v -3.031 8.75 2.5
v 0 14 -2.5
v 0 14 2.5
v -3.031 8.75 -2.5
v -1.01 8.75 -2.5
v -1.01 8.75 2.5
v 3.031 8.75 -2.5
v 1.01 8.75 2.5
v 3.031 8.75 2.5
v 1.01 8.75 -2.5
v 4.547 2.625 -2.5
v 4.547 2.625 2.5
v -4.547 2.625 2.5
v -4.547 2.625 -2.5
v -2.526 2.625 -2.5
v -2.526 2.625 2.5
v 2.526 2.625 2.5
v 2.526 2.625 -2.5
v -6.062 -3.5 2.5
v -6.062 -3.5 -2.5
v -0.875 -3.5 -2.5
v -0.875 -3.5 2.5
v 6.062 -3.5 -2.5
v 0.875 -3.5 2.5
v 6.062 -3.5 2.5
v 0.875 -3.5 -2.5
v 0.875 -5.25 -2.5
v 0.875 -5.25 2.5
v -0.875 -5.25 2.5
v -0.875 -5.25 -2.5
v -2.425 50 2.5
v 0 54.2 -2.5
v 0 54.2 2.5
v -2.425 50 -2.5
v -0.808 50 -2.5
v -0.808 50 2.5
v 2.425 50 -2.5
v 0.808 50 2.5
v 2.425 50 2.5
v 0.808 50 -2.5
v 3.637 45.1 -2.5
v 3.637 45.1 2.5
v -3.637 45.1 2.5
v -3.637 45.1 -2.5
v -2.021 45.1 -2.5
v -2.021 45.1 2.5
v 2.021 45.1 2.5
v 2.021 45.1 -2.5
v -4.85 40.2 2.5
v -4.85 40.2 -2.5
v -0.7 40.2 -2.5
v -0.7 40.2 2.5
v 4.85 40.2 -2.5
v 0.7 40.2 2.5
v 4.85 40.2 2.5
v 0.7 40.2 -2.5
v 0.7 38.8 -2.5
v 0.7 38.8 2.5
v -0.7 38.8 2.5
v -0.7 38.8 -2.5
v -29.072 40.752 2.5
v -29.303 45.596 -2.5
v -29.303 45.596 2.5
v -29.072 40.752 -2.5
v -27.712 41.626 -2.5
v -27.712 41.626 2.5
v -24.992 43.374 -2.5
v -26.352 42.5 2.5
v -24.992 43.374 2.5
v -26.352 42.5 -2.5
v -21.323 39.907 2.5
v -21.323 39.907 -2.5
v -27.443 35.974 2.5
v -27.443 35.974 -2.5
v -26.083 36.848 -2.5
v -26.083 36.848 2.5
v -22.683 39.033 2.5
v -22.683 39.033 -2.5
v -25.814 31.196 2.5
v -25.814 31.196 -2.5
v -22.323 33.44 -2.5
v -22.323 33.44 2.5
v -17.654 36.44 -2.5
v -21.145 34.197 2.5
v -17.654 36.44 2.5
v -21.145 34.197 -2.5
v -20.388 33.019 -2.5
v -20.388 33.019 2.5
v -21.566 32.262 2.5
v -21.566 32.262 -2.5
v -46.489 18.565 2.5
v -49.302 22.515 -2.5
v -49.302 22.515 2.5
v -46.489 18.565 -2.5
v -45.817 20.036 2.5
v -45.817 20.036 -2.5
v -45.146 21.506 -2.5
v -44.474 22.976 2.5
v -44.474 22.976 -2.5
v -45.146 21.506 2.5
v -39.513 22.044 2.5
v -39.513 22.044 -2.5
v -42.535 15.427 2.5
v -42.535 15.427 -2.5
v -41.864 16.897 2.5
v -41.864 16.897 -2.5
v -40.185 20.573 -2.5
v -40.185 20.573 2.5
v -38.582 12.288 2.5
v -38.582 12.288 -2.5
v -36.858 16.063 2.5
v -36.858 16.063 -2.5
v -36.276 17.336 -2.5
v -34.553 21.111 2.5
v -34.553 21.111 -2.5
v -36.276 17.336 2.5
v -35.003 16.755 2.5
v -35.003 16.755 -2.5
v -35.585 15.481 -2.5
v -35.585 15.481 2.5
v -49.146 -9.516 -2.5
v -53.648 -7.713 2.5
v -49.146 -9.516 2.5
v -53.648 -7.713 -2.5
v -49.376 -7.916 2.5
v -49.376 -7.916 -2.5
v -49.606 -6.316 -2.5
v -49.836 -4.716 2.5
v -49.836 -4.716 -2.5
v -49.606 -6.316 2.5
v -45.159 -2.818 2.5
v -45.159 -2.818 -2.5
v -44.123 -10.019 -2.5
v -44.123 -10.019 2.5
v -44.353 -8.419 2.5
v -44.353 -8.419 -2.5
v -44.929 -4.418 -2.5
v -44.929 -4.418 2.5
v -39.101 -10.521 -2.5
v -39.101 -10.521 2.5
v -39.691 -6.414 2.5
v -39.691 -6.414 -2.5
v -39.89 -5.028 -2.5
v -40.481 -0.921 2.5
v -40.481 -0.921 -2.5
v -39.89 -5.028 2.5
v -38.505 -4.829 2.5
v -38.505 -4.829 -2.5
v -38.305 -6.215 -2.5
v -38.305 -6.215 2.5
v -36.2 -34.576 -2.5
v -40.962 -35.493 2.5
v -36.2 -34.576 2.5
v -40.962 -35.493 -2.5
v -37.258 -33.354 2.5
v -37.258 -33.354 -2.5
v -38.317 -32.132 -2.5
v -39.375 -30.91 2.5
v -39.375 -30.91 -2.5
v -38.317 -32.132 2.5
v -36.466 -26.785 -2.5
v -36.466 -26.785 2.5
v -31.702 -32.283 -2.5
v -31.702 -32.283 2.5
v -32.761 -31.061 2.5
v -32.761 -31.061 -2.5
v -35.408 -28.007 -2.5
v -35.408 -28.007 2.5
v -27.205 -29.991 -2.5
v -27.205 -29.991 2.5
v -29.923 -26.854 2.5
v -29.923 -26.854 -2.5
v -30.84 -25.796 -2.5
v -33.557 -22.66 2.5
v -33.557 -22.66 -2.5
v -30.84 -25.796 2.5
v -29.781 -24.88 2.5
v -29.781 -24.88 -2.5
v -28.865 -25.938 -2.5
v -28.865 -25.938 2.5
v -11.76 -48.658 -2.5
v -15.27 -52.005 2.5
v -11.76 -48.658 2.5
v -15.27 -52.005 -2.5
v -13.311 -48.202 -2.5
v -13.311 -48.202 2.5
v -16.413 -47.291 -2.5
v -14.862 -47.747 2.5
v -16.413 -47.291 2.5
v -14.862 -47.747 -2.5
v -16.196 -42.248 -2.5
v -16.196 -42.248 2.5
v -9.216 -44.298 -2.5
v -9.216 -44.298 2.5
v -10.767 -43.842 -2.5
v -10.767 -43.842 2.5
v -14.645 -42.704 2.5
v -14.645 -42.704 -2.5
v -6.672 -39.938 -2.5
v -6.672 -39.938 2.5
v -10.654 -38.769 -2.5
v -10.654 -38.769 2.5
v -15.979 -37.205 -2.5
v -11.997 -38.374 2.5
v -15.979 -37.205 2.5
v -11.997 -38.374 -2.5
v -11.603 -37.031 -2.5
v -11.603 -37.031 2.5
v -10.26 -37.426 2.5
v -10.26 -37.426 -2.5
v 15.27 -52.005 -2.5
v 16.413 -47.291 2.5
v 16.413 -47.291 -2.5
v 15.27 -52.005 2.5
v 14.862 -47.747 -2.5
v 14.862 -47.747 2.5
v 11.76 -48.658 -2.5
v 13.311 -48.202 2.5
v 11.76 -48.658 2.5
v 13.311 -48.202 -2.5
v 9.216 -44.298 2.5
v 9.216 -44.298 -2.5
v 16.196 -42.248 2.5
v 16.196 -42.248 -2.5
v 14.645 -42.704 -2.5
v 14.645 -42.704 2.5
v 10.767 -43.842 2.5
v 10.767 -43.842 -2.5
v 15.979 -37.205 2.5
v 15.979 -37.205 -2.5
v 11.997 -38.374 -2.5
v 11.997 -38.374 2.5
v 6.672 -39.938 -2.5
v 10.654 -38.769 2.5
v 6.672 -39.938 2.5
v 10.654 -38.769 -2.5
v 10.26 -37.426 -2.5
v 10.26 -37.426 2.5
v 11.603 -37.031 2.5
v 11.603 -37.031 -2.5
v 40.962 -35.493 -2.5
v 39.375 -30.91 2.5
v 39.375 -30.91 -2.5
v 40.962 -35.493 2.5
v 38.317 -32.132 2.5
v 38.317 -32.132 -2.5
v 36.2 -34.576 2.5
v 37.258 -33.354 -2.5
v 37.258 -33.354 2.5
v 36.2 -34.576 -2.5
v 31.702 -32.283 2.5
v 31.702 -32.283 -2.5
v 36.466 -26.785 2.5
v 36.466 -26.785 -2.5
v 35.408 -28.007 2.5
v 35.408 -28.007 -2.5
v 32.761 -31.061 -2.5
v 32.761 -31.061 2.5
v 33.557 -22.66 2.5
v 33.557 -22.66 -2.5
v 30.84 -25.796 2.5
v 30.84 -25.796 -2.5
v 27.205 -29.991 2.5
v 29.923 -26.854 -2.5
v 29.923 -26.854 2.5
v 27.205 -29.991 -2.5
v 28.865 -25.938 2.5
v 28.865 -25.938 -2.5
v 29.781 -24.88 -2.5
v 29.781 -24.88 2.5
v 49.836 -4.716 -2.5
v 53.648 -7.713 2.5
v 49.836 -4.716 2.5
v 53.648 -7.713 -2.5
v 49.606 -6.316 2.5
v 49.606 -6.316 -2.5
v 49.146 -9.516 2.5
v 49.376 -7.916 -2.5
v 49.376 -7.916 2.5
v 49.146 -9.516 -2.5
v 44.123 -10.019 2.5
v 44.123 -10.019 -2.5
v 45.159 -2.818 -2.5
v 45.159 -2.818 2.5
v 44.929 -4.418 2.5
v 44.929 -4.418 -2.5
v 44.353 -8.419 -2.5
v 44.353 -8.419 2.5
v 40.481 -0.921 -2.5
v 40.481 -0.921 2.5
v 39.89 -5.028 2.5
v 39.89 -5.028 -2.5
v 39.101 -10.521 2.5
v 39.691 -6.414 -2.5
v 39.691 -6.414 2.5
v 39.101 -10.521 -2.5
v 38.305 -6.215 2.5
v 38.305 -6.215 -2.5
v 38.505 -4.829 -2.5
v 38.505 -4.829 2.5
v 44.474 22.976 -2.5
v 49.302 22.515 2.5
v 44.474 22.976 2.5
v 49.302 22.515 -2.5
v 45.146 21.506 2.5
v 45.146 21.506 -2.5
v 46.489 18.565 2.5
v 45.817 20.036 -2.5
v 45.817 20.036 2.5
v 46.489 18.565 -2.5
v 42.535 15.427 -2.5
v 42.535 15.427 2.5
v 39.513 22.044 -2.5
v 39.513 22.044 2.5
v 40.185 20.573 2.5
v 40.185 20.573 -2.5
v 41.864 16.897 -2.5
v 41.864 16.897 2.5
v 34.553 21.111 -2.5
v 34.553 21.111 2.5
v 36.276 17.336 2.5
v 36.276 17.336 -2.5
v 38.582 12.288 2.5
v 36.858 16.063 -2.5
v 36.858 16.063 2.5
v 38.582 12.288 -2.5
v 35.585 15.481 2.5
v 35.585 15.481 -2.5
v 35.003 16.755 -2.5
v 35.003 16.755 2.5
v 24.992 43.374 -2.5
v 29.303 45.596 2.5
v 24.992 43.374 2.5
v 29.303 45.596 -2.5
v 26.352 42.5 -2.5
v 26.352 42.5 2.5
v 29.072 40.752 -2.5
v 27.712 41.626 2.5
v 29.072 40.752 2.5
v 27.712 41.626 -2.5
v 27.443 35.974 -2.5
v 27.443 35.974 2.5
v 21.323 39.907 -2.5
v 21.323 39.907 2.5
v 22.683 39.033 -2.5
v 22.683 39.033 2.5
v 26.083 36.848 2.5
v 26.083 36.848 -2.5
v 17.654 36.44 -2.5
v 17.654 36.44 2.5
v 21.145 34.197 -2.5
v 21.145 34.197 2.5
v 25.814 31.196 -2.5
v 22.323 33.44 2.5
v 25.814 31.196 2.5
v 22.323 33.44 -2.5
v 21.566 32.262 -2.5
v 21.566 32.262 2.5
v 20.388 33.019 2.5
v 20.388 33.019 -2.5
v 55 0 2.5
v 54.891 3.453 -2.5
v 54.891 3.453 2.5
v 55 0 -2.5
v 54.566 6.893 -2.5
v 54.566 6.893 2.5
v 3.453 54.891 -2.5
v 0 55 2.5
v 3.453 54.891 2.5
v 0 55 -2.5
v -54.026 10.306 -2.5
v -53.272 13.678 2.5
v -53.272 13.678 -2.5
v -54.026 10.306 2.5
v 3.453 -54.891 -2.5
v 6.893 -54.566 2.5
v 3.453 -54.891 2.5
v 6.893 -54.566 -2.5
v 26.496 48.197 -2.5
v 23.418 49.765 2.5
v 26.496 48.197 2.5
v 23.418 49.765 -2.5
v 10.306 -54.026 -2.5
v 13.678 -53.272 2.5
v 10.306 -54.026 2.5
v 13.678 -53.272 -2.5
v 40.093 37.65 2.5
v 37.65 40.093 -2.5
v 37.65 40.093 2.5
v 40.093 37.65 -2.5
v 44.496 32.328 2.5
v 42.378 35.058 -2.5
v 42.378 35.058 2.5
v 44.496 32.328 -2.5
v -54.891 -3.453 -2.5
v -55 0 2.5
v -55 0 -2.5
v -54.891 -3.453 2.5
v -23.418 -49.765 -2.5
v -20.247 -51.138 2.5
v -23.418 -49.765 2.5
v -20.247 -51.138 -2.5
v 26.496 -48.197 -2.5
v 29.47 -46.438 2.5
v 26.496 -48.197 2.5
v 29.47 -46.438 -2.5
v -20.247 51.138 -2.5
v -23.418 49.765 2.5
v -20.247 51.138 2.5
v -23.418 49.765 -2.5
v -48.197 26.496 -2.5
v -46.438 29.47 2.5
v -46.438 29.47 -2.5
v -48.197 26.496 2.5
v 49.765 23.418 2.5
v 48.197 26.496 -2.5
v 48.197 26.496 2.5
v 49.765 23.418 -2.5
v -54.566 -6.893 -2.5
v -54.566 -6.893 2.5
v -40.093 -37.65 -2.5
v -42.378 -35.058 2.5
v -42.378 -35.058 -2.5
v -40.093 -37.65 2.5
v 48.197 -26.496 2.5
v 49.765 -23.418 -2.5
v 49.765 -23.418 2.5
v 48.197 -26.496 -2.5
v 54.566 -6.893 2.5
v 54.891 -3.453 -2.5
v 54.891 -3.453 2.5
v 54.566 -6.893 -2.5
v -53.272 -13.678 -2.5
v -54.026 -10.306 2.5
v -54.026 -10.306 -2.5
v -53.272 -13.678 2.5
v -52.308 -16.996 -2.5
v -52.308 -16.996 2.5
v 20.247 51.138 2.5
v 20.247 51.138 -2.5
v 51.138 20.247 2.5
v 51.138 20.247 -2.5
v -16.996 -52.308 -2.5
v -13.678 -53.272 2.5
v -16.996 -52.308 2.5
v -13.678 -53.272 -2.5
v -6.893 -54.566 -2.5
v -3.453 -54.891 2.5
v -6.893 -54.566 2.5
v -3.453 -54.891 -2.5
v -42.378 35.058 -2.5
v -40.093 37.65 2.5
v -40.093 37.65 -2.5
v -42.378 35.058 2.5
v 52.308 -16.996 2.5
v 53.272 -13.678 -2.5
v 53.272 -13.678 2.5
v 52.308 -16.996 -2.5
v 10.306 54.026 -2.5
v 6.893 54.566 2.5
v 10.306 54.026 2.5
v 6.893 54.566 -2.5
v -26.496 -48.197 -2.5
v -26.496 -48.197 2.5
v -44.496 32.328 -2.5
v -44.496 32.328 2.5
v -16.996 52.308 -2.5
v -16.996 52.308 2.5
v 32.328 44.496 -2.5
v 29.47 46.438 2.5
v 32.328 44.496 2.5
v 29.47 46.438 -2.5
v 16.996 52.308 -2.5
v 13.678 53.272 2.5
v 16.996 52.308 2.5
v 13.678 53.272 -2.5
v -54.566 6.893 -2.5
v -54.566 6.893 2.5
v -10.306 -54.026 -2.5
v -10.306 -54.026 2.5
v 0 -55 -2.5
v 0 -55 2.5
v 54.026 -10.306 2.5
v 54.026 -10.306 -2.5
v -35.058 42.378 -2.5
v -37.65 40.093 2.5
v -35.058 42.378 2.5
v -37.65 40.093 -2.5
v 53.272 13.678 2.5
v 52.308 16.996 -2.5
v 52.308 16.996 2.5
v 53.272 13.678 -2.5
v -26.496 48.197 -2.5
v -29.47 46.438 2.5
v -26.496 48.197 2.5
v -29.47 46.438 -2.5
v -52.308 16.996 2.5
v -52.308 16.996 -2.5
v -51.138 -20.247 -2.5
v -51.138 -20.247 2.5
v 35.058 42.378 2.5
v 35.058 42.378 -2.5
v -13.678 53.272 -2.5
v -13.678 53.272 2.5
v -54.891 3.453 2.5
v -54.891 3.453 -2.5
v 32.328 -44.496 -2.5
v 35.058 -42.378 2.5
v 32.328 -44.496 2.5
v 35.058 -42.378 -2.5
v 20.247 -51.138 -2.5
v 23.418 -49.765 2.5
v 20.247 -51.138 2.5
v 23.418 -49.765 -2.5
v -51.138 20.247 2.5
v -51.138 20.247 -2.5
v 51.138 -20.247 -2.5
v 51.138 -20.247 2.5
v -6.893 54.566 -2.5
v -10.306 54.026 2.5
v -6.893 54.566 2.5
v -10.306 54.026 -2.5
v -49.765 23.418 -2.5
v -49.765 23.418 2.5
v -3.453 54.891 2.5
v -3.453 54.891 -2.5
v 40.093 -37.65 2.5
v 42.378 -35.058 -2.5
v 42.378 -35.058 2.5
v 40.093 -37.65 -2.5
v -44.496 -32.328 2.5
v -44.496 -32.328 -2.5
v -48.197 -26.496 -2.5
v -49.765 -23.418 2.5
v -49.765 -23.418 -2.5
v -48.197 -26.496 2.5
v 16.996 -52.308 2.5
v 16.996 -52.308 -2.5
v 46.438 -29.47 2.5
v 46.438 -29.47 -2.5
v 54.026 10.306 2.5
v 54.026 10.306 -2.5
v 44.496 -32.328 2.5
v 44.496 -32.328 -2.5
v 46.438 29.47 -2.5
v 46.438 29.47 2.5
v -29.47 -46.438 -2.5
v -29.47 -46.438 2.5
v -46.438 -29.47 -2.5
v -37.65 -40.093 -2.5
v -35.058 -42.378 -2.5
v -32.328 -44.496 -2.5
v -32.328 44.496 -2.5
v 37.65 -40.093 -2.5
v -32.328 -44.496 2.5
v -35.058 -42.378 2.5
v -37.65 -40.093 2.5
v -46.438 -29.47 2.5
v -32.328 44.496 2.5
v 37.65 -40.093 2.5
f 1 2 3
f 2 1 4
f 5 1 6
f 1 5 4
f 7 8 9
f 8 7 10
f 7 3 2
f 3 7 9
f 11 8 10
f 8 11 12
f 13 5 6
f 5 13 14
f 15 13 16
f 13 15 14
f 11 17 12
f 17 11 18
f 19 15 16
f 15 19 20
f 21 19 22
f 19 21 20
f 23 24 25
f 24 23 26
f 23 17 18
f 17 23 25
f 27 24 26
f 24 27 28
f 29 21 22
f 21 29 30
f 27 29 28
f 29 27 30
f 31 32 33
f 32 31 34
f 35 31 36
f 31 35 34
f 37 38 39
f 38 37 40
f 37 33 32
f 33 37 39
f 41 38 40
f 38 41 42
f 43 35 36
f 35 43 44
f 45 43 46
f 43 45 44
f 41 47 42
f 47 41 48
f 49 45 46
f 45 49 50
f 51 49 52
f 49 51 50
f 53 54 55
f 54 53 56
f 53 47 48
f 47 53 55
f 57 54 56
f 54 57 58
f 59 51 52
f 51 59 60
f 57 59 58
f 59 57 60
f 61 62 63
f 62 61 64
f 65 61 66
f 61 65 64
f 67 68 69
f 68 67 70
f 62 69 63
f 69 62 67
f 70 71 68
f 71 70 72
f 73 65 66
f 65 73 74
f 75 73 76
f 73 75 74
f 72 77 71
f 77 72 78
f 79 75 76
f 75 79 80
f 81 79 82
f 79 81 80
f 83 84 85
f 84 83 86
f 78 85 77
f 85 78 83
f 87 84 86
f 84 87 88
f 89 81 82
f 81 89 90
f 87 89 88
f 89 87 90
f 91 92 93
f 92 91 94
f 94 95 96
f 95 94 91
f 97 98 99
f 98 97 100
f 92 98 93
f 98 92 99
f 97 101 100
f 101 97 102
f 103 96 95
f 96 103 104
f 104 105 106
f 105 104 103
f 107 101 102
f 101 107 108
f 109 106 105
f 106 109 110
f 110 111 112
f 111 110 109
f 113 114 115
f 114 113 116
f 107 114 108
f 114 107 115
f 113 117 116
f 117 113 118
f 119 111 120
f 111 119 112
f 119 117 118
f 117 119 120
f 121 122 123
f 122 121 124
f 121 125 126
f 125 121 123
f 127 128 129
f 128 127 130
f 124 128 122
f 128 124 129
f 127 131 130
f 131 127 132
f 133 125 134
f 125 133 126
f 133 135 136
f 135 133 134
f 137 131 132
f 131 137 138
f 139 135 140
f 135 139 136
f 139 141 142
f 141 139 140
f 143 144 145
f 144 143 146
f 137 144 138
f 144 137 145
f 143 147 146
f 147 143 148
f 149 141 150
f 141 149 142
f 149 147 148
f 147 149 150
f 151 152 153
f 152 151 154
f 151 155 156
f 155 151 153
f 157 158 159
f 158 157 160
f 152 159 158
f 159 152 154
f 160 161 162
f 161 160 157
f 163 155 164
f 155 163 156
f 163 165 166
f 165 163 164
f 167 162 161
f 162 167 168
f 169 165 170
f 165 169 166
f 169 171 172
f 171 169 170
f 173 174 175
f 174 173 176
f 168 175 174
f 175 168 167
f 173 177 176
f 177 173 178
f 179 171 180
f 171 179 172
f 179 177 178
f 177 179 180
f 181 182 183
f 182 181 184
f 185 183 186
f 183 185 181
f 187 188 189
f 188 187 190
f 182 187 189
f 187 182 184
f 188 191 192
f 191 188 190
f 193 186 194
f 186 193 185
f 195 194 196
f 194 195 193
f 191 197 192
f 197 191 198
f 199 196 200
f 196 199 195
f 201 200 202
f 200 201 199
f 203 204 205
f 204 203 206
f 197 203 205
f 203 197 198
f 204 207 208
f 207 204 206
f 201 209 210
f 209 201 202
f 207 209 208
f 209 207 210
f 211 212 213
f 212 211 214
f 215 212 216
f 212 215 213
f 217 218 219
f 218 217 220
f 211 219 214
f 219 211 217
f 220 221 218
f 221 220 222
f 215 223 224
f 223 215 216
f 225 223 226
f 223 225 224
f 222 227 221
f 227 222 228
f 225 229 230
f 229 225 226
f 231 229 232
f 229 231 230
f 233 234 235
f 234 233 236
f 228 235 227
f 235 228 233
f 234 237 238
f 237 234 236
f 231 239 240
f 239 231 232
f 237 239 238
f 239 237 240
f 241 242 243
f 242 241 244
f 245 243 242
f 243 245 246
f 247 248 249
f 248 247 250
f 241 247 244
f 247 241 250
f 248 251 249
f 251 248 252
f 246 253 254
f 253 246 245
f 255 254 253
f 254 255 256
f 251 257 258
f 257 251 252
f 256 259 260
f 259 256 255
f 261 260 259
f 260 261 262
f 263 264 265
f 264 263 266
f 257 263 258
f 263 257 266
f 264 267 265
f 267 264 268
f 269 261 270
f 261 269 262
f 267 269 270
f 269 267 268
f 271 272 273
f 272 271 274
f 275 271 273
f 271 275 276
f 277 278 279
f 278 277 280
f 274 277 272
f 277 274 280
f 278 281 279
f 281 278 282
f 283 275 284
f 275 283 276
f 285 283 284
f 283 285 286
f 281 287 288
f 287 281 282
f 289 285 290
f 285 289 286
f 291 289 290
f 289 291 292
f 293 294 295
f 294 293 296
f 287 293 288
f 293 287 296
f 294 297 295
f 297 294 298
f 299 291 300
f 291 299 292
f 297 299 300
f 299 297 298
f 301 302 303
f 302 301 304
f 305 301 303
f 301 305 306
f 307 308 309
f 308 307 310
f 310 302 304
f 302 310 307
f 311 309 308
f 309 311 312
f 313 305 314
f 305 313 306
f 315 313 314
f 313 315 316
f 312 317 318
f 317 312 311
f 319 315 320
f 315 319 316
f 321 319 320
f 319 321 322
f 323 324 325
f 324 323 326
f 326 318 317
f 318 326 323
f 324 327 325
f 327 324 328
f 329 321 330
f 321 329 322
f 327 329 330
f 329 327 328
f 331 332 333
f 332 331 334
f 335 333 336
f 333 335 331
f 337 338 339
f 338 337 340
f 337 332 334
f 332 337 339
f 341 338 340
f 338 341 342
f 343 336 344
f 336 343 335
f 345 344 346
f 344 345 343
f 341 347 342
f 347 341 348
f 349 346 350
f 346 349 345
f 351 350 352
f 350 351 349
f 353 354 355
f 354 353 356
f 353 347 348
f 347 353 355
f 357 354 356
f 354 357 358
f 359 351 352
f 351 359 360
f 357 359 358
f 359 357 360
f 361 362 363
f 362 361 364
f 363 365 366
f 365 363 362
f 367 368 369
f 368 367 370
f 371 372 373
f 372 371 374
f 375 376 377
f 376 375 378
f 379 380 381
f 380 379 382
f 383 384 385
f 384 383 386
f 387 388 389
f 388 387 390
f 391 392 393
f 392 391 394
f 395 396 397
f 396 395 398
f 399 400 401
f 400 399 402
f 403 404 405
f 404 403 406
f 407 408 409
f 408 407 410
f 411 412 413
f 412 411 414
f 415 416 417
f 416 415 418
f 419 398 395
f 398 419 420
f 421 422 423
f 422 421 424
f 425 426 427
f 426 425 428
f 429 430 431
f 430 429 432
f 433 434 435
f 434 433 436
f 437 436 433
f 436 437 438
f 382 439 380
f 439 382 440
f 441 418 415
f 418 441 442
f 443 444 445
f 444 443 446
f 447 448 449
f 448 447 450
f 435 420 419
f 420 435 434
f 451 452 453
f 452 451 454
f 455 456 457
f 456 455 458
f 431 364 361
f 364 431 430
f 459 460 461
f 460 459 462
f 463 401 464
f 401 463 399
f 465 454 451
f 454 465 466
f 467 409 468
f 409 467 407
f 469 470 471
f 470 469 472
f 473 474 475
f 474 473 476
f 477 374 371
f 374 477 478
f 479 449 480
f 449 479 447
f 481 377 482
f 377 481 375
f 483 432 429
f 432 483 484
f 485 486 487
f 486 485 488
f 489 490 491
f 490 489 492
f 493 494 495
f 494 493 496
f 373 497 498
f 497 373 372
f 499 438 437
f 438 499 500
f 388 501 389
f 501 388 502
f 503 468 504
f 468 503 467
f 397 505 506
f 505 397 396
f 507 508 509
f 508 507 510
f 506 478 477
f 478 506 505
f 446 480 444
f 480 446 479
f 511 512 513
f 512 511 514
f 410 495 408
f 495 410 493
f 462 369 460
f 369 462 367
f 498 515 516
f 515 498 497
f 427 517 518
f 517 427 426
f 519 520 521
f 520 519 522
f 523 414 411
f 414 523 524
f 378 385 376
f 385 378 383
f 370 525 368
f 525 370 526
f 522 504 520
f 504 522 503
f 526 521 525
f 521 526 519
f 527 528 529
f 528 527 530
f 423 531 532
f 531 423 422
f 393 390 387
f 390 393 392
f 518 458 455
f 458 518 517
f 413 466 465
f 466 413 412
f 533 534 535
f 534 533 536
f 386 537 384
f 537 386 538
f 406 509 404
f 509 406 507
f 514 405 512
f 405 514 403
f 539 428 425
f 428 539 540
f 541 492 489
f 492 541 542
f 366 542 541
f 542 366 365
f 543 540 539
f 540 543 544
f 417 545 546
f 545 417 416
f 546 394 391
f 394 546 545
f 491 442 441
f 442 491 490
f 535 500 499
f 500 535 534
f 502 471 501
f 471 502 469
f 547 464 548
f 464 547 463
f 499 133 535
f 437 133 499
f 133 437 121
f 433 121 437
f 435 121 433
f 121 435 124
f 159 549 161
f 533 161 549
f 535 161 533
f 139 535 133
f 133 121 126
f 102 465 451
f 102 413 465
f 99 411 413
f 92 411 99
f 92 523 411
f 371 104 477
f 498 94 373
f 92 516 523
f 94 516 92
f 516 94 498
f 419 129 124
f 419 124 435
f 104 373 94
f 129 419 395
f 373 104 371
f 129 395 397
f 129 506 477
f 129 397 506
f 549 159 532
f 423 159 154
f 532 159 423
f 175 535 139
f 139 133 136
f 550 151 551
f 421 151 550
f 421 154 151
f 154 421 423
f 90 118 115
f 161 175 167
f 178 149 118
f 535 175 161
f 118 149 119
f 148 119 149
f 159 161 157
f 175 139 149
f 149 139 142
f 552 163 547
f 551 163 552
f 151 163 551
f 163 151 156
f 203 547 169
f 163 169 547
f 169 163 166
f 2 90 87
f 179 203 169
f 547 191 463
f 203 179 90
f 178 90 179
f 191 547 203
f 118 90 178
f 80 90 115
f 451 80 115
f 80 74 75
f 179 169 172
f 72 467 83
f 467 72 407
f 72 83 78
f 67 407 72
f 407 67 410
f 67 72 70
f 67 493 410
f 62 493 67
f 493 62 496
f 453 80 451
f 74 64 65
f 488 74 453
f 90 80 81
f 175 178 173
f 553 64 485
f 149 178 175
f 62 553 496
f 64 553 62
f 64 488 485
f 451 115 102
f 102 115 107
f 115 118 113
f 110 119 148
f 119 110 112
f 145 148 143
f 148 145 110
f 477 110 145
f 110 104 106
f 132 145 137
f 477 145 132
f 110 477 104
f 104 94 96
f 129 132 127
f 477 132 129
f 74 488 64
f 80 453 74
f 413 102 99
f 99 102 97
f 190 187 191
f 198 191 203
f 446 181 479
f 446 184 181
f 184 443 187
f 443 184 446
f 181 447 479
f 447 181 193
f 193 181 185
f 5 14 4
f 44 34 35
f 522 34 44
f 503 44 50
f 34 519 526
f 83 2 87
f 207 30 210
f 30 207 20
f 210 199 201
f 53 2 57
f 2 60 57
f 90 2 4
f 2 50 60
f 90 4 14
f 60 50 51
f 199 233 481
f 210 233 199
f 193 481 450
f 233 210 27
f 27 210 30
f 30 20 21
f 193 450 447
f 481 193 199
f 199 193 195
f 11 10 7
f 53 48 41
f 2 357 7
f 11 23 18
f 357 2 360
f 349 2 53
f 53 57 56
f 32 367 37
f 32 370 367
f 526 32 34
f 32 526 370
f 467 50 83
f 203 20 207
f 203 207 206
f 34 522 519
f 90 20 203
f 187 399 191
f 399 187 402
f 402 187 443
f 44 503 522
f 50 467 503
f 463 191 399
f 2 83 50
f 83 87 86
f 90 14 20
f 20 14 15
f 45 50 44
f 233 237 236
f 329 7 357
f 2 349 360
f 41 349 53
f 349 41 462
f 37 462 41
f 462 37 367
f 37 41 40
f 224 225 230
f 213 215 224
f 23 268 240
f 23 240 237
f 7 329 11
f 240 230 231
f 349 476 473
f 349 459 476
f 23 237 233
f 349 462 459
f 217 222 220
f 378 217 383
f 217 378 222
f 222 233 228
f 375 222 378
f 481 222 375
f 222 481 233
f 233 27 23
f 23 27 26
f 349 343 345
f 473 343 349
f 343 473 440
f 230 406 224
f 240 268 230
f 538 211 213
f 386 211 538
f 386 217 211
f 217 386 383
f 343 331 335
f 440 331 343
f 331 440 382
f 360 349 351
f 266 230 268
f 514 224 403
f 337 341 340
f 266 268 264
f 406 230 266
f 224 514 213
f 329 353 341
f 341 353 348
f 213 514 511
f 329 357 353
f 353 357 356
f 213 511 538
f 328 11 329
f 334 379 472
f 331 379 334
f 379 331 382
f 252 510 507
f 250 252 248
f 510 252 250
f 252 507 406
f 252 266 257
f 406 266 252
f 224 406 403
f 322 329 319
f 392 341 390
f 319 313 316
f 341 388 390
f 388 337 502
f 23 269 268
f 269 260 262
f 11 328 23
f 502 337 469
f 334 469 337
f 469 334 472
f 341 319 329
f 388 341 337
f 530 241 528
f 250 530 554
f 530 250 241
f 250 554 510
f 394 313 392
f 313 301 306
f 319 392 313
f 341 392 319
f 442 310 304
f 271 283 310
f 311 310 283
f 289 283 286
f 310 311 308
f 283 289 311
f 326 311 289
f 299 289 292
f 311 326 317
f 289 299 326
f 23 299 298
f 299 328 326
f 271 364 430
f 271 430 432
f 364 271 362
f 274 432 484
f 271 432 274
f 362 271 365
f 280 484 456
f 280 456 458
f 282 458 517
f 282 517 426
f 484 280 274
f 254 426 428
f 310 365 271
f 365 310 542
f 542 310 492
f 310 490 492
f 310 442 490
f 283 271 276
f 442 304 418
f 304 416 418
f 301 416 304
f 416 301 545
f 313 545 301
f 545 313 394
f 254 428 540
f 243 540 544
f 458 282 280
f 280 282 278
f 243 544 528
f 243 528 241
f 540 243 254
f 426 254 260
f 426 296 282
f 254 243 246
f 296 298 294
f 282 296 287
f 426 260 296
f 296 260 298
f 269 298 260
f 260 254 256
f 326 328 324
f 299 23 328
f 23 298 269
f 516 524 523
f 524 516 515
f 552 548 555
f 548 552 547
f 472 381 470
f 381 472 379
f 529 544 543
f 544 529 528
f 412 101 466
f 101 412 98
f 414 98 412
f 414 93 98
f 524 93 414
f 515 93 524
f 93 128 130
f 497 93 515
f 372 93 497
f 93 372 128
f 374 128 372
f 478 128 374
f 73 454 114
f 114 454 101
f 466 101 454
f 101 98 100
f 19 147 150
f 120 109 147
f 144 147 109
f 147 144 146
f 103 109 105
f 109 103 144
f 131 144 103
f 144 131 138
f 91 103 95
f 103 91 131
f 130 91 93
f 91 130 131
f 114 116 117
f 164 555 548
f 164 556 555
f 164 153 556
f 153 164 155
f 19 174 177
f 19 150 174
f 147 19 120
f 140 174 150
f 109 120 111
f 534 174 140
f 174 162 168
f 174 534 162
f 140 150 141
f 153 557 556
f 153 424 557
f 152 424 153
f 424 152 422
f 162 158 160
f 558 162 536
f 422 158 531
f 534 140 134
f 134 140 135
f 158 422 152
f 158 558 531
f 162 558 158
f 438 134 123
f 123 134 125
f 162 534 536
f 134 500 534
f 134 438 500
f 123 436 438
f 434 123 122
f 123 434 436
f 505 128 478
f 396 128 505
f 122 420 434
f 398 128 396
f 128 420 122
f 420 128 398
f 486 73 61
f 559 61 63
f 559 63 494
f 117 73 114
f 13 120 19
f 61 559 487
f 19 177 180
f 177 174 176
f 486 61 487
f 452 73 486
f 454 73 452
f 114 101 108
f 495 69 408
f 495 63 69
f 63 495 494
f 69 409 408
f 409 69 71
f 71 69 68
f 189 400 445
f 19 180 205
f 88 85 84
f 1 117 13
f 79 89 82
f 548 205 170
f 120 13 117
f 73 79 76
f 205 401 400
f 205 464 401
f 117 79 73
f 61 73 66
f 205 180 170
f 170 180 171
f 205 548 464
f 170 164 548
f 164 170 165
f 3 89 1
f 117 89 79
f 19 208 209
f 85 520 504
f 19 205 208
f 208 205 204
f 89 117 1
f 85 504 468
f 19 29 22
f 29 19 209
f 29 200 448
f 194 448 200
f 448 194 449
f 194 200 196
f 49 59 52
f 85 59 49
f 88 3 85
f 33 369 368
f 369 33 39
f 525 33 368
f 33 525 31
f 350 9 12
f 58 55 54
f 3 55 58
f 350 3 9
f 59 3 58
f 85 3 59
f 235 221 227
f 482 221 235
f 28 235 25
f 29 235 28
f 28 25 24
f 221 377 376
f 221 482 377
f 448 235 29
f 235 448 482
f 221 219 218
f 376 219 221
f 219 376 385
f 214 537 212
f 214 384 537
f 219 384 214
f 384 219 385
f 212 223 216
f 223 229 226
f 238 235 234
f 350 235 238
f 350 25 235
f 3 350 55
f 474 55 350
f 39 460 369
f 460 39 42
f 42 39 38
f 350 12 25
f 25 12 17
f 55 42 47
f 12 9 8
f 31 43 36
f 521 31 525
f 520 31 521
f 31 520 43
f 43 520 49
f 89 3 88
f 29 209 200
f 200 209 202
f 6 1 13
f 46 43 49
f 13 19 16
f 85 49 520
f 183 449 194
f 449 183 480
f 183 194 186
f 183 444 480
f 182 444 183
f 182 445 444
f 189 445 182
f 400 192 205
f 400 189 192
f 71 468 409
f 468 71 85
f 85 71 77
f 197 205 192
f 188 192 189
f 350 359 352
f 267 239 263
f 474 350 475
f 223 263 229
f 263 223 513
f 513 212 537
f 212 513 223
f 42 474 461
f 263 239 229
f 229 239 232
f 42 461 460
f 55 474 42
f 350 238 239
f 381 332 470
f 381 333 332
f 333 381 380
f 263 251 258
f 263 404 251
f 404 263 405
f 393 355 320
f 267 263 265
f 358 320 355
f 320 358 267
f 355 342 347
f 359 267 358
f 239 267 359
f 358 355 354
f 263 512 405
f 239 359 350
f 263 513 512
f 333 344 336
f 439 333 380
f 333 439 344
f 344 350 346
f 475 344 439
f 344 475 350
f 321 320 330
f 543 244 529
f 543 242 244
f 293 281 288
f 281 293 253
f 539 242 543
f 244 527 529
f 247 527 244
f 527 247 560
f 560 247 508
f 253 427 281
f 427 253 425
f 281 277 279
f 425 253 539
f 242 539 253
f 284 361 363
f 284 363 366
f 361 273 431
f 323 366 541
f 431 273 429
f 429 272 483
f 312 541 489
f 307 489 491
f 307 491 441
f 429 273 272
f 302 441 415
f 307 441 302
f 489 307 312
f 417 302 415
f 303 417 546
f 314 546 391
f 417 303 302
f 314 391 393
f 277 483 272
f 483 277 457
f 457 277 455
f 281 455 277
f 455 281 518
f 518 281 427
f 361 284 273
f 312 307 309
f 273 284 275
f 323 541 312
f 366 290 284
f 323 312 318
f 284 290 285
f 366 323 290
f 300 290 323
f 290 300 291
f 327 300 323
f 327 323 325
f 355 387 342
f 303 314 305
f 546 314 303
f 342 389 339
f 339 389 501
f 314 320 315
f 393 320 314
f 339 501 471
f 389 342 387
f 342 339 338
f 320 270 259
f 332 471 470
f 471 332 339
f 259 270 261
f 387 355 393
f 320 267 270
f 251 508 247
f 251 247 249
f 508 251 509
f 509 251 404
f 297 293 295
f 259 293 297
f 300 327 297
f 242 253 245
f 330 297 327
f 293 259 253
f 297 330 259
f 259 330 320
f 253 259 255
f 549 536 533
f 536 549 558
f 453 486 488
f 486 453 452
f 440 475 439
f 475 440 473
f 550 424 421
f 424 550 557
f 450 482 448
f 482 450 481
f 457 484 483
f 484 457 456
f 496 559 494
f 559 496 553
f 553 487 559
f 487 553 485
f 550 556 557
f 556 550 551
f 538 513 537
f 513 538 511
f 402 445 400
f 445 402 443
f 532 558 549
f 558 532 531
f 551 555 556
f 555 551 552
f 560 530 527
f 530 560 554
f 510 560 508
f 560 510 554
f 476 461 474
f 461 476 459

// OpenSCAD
// file: ../../../shapes/trees/christmas/christmas-tree.scad
christmasTree();

module christmasTree(height = 3)
{
    union()
    {
        // top triangle
        translate([0, 30, 0])
        triangle(10, height);
        
        // middle triangle
        translate([0, 15, 0])
        color("green")
        triangle(15, height);
        
        // bottom triangle
        triangle(20, height);
        
        // trunk
        color("brown")
        translate([-2.5, -15, 0])
        cube([5, 5, height]);
    }
}

module triangle(size, height)
{
    rotate([0, 0, 90])
    cylinder(r=size, 
             $fn=3,
             h=height);
}
// file: ../../../shapes/spurs/spurs-a.scad
// Module names are of the form poly_<inkscape-path-id>().  As a result,
// you can associate a polygon in this OpenSCAD program with the corresponding
// SVG element in the Inkscape document by looking for the XML element with
// the attribute id="inkscape-path-id".

// fudge value is used to ensure that subtracted solids are a tad taller
// in the z dimension than the polygon being subtracted from.  This helps
// keep the resulting .stl file manifold.
fudge = 0.1;

module spurs(h)
{
  scale([25.4/90, -25.4/90, 1]) union()
  {
    linear_extrude(height=h)
      polygon([[13.500000,-56.000000],[29.500000,-55.000000],[54.500000,-55.000000],[58.503750,-55.048750],[60.522969,-55.341719],[62.290000,-56.020000],[64.325156,-57.853594],[66.241250,-60.541250],[69.240000,-66.000000],[80.500000,-87.000000],[106.280000,-135.000000],[118.870000,-159.000000],[122.780000,-198.000000],[124.023594,-204.882813],[125.843750,-209.652500],[128.457031,-214.095937],[132.080000,-220.000000],[148.490000,-248.000000],[153.376719,-256.487656],[155.041895,-259.143652],[156.518750,-260.956250],[158.055137,-262.086816],[159.898906,-262.696719],[165.500000,-263.000000],[214.500000,-263.000000],[214.500000,-213.000000],[213.360000,-196.000000],[213.360000,-154.000000],[213.495000,-150.462500],[213.360000,-147.000000],[196.920000,-117.000000],[156.350000,-45.000000],[125.920000,9.000000],[120.671250,18.592500],[117.385469,23.577187],[115.794199,25.366055],[114.320000,26.400000],[112.797344,26.797500],[110.981250,26.970000],[107.500000,27.000000],[79.500000,27.000000],[65.500000,28.000000],[31.500000,28.000000],[27.943750,28.030000],[24.500000,28.600000],[22.684180,29.597539],[20.548438,31.277812],[15.792500,35.922500],[7.670000,45.000000],[-36.500000,94.040000],[-25.500000,94.040000],[-15.500000,95.000000],[1.500000,95.000000],[22.500000,96.000000],[2.500000,114.080000],[-38.500000,149.000000],[-23.230000,165.000000],[-3.230000,188.000000],[14.500000,210.000000],[-66.500000,189.000000],[-91.500000,263.000000],[-92.970664,261.624141],[-94.426562,259.592500],[-97.197500,254.302500],[-101.500000,244.000000],[-121.500000,198.000000],[-200.500000,222.000000],[-174.840000,182.000000],[-154.500000,151.000000],[-187.500000,128.020000],[-214.500000,108.000000],[-166.500000,103.830000],[-135.500000,101.000000],[-137.410000,77.000000],[-139.590000,41.000000],[-140.500000,31.000000],[-138.108496,32.343340],[-135.722969,34.055469],[-131.038750,38.223750],[-122.500000,47.000000],[-111.500000,57.040000],[-94.500000,74.000000],[-77.500000,27.000000],[-107.500000,26.000000],[-117.196250,25.451250],[-122.812656,24.814531],[-126.090000,23.980000],[-127.513906,22.488438],[-128.773750,20.335000],[-130.730000,16.000000],[-138.200000,-1.000000],[-140.195000,-5.868750],[-140.649688,-8.406719],[-140.330000,-11.000000],[-134.780000,-21.000000],[-120.780000,-45.000000],[-74.650000,-124.000000],[-55.110000,-158.000000],[-46.570000,-206.000000],[-30.280000,-238.000000],[-21.920000,-254.000000],[-19.818750,-257.793750],[-18.535156,-259.646094],[-17.110000,-260.980000],[-15.251406,-261.684844],[-12.943750,-261.983750],[-8.500000,-261.990000],[5.500000,-261.000000],[19.500000,-261.000000],[31.500000,-260.040000],[43.500000,-260.040000],[43.500000,-217.000000],[44.500000,-200.000000],[44.500000,-162.000000],[43.800000,-154.000000],[28.100000,-127.000000],[-14.500000,-56.000000],[13.500000,-56.000000]]);
  }
}

spurs(5);
// file: ../../coin.scad
use <../shapes/spurs/spurs-a.scad>
use <../shapes/trees/christmas/christmas-tree.scad>

module coin(outterIcon,
//            outterIcon,
            outerIconCount,            
            outerIconXyScale,
            radius,
            height)
{
    difference()
    {
        // main disk
        cylinder (h = height, r=radius, center = true, $fn=100);
        
        // centered spur
        translate([0,0,-5])
        scale([0.35, 0.35, 3.0])
        coinIcon(centerIcon, height);
        
        // outer spurs
        for ( i = [0 : outerIconCount] )
        {
            rotate( i * 360 / (outerIconCount+1), [0, 0, 1])
            translate([0, 43, -5])
            scale([outerIconXyScale, outerIconXyScale, 3.0])
            coinIcon(outterIcon, height);
        }
    }    
}

module coinIcon(iconName, height)
{
    if(iconName == "Spur")
    {
        spurs(height);
    }
    else
    {
        // defalut
        christmasTree(height);
    }
//  import(centerIcon);    
}
// main file
use <../../coin.scad>;

coin(centerIcon = "tree",
                     outerIconCount = 10,            
                     outerIconXyScale = 0.28,
                     radius = 55,
                     height=5);
